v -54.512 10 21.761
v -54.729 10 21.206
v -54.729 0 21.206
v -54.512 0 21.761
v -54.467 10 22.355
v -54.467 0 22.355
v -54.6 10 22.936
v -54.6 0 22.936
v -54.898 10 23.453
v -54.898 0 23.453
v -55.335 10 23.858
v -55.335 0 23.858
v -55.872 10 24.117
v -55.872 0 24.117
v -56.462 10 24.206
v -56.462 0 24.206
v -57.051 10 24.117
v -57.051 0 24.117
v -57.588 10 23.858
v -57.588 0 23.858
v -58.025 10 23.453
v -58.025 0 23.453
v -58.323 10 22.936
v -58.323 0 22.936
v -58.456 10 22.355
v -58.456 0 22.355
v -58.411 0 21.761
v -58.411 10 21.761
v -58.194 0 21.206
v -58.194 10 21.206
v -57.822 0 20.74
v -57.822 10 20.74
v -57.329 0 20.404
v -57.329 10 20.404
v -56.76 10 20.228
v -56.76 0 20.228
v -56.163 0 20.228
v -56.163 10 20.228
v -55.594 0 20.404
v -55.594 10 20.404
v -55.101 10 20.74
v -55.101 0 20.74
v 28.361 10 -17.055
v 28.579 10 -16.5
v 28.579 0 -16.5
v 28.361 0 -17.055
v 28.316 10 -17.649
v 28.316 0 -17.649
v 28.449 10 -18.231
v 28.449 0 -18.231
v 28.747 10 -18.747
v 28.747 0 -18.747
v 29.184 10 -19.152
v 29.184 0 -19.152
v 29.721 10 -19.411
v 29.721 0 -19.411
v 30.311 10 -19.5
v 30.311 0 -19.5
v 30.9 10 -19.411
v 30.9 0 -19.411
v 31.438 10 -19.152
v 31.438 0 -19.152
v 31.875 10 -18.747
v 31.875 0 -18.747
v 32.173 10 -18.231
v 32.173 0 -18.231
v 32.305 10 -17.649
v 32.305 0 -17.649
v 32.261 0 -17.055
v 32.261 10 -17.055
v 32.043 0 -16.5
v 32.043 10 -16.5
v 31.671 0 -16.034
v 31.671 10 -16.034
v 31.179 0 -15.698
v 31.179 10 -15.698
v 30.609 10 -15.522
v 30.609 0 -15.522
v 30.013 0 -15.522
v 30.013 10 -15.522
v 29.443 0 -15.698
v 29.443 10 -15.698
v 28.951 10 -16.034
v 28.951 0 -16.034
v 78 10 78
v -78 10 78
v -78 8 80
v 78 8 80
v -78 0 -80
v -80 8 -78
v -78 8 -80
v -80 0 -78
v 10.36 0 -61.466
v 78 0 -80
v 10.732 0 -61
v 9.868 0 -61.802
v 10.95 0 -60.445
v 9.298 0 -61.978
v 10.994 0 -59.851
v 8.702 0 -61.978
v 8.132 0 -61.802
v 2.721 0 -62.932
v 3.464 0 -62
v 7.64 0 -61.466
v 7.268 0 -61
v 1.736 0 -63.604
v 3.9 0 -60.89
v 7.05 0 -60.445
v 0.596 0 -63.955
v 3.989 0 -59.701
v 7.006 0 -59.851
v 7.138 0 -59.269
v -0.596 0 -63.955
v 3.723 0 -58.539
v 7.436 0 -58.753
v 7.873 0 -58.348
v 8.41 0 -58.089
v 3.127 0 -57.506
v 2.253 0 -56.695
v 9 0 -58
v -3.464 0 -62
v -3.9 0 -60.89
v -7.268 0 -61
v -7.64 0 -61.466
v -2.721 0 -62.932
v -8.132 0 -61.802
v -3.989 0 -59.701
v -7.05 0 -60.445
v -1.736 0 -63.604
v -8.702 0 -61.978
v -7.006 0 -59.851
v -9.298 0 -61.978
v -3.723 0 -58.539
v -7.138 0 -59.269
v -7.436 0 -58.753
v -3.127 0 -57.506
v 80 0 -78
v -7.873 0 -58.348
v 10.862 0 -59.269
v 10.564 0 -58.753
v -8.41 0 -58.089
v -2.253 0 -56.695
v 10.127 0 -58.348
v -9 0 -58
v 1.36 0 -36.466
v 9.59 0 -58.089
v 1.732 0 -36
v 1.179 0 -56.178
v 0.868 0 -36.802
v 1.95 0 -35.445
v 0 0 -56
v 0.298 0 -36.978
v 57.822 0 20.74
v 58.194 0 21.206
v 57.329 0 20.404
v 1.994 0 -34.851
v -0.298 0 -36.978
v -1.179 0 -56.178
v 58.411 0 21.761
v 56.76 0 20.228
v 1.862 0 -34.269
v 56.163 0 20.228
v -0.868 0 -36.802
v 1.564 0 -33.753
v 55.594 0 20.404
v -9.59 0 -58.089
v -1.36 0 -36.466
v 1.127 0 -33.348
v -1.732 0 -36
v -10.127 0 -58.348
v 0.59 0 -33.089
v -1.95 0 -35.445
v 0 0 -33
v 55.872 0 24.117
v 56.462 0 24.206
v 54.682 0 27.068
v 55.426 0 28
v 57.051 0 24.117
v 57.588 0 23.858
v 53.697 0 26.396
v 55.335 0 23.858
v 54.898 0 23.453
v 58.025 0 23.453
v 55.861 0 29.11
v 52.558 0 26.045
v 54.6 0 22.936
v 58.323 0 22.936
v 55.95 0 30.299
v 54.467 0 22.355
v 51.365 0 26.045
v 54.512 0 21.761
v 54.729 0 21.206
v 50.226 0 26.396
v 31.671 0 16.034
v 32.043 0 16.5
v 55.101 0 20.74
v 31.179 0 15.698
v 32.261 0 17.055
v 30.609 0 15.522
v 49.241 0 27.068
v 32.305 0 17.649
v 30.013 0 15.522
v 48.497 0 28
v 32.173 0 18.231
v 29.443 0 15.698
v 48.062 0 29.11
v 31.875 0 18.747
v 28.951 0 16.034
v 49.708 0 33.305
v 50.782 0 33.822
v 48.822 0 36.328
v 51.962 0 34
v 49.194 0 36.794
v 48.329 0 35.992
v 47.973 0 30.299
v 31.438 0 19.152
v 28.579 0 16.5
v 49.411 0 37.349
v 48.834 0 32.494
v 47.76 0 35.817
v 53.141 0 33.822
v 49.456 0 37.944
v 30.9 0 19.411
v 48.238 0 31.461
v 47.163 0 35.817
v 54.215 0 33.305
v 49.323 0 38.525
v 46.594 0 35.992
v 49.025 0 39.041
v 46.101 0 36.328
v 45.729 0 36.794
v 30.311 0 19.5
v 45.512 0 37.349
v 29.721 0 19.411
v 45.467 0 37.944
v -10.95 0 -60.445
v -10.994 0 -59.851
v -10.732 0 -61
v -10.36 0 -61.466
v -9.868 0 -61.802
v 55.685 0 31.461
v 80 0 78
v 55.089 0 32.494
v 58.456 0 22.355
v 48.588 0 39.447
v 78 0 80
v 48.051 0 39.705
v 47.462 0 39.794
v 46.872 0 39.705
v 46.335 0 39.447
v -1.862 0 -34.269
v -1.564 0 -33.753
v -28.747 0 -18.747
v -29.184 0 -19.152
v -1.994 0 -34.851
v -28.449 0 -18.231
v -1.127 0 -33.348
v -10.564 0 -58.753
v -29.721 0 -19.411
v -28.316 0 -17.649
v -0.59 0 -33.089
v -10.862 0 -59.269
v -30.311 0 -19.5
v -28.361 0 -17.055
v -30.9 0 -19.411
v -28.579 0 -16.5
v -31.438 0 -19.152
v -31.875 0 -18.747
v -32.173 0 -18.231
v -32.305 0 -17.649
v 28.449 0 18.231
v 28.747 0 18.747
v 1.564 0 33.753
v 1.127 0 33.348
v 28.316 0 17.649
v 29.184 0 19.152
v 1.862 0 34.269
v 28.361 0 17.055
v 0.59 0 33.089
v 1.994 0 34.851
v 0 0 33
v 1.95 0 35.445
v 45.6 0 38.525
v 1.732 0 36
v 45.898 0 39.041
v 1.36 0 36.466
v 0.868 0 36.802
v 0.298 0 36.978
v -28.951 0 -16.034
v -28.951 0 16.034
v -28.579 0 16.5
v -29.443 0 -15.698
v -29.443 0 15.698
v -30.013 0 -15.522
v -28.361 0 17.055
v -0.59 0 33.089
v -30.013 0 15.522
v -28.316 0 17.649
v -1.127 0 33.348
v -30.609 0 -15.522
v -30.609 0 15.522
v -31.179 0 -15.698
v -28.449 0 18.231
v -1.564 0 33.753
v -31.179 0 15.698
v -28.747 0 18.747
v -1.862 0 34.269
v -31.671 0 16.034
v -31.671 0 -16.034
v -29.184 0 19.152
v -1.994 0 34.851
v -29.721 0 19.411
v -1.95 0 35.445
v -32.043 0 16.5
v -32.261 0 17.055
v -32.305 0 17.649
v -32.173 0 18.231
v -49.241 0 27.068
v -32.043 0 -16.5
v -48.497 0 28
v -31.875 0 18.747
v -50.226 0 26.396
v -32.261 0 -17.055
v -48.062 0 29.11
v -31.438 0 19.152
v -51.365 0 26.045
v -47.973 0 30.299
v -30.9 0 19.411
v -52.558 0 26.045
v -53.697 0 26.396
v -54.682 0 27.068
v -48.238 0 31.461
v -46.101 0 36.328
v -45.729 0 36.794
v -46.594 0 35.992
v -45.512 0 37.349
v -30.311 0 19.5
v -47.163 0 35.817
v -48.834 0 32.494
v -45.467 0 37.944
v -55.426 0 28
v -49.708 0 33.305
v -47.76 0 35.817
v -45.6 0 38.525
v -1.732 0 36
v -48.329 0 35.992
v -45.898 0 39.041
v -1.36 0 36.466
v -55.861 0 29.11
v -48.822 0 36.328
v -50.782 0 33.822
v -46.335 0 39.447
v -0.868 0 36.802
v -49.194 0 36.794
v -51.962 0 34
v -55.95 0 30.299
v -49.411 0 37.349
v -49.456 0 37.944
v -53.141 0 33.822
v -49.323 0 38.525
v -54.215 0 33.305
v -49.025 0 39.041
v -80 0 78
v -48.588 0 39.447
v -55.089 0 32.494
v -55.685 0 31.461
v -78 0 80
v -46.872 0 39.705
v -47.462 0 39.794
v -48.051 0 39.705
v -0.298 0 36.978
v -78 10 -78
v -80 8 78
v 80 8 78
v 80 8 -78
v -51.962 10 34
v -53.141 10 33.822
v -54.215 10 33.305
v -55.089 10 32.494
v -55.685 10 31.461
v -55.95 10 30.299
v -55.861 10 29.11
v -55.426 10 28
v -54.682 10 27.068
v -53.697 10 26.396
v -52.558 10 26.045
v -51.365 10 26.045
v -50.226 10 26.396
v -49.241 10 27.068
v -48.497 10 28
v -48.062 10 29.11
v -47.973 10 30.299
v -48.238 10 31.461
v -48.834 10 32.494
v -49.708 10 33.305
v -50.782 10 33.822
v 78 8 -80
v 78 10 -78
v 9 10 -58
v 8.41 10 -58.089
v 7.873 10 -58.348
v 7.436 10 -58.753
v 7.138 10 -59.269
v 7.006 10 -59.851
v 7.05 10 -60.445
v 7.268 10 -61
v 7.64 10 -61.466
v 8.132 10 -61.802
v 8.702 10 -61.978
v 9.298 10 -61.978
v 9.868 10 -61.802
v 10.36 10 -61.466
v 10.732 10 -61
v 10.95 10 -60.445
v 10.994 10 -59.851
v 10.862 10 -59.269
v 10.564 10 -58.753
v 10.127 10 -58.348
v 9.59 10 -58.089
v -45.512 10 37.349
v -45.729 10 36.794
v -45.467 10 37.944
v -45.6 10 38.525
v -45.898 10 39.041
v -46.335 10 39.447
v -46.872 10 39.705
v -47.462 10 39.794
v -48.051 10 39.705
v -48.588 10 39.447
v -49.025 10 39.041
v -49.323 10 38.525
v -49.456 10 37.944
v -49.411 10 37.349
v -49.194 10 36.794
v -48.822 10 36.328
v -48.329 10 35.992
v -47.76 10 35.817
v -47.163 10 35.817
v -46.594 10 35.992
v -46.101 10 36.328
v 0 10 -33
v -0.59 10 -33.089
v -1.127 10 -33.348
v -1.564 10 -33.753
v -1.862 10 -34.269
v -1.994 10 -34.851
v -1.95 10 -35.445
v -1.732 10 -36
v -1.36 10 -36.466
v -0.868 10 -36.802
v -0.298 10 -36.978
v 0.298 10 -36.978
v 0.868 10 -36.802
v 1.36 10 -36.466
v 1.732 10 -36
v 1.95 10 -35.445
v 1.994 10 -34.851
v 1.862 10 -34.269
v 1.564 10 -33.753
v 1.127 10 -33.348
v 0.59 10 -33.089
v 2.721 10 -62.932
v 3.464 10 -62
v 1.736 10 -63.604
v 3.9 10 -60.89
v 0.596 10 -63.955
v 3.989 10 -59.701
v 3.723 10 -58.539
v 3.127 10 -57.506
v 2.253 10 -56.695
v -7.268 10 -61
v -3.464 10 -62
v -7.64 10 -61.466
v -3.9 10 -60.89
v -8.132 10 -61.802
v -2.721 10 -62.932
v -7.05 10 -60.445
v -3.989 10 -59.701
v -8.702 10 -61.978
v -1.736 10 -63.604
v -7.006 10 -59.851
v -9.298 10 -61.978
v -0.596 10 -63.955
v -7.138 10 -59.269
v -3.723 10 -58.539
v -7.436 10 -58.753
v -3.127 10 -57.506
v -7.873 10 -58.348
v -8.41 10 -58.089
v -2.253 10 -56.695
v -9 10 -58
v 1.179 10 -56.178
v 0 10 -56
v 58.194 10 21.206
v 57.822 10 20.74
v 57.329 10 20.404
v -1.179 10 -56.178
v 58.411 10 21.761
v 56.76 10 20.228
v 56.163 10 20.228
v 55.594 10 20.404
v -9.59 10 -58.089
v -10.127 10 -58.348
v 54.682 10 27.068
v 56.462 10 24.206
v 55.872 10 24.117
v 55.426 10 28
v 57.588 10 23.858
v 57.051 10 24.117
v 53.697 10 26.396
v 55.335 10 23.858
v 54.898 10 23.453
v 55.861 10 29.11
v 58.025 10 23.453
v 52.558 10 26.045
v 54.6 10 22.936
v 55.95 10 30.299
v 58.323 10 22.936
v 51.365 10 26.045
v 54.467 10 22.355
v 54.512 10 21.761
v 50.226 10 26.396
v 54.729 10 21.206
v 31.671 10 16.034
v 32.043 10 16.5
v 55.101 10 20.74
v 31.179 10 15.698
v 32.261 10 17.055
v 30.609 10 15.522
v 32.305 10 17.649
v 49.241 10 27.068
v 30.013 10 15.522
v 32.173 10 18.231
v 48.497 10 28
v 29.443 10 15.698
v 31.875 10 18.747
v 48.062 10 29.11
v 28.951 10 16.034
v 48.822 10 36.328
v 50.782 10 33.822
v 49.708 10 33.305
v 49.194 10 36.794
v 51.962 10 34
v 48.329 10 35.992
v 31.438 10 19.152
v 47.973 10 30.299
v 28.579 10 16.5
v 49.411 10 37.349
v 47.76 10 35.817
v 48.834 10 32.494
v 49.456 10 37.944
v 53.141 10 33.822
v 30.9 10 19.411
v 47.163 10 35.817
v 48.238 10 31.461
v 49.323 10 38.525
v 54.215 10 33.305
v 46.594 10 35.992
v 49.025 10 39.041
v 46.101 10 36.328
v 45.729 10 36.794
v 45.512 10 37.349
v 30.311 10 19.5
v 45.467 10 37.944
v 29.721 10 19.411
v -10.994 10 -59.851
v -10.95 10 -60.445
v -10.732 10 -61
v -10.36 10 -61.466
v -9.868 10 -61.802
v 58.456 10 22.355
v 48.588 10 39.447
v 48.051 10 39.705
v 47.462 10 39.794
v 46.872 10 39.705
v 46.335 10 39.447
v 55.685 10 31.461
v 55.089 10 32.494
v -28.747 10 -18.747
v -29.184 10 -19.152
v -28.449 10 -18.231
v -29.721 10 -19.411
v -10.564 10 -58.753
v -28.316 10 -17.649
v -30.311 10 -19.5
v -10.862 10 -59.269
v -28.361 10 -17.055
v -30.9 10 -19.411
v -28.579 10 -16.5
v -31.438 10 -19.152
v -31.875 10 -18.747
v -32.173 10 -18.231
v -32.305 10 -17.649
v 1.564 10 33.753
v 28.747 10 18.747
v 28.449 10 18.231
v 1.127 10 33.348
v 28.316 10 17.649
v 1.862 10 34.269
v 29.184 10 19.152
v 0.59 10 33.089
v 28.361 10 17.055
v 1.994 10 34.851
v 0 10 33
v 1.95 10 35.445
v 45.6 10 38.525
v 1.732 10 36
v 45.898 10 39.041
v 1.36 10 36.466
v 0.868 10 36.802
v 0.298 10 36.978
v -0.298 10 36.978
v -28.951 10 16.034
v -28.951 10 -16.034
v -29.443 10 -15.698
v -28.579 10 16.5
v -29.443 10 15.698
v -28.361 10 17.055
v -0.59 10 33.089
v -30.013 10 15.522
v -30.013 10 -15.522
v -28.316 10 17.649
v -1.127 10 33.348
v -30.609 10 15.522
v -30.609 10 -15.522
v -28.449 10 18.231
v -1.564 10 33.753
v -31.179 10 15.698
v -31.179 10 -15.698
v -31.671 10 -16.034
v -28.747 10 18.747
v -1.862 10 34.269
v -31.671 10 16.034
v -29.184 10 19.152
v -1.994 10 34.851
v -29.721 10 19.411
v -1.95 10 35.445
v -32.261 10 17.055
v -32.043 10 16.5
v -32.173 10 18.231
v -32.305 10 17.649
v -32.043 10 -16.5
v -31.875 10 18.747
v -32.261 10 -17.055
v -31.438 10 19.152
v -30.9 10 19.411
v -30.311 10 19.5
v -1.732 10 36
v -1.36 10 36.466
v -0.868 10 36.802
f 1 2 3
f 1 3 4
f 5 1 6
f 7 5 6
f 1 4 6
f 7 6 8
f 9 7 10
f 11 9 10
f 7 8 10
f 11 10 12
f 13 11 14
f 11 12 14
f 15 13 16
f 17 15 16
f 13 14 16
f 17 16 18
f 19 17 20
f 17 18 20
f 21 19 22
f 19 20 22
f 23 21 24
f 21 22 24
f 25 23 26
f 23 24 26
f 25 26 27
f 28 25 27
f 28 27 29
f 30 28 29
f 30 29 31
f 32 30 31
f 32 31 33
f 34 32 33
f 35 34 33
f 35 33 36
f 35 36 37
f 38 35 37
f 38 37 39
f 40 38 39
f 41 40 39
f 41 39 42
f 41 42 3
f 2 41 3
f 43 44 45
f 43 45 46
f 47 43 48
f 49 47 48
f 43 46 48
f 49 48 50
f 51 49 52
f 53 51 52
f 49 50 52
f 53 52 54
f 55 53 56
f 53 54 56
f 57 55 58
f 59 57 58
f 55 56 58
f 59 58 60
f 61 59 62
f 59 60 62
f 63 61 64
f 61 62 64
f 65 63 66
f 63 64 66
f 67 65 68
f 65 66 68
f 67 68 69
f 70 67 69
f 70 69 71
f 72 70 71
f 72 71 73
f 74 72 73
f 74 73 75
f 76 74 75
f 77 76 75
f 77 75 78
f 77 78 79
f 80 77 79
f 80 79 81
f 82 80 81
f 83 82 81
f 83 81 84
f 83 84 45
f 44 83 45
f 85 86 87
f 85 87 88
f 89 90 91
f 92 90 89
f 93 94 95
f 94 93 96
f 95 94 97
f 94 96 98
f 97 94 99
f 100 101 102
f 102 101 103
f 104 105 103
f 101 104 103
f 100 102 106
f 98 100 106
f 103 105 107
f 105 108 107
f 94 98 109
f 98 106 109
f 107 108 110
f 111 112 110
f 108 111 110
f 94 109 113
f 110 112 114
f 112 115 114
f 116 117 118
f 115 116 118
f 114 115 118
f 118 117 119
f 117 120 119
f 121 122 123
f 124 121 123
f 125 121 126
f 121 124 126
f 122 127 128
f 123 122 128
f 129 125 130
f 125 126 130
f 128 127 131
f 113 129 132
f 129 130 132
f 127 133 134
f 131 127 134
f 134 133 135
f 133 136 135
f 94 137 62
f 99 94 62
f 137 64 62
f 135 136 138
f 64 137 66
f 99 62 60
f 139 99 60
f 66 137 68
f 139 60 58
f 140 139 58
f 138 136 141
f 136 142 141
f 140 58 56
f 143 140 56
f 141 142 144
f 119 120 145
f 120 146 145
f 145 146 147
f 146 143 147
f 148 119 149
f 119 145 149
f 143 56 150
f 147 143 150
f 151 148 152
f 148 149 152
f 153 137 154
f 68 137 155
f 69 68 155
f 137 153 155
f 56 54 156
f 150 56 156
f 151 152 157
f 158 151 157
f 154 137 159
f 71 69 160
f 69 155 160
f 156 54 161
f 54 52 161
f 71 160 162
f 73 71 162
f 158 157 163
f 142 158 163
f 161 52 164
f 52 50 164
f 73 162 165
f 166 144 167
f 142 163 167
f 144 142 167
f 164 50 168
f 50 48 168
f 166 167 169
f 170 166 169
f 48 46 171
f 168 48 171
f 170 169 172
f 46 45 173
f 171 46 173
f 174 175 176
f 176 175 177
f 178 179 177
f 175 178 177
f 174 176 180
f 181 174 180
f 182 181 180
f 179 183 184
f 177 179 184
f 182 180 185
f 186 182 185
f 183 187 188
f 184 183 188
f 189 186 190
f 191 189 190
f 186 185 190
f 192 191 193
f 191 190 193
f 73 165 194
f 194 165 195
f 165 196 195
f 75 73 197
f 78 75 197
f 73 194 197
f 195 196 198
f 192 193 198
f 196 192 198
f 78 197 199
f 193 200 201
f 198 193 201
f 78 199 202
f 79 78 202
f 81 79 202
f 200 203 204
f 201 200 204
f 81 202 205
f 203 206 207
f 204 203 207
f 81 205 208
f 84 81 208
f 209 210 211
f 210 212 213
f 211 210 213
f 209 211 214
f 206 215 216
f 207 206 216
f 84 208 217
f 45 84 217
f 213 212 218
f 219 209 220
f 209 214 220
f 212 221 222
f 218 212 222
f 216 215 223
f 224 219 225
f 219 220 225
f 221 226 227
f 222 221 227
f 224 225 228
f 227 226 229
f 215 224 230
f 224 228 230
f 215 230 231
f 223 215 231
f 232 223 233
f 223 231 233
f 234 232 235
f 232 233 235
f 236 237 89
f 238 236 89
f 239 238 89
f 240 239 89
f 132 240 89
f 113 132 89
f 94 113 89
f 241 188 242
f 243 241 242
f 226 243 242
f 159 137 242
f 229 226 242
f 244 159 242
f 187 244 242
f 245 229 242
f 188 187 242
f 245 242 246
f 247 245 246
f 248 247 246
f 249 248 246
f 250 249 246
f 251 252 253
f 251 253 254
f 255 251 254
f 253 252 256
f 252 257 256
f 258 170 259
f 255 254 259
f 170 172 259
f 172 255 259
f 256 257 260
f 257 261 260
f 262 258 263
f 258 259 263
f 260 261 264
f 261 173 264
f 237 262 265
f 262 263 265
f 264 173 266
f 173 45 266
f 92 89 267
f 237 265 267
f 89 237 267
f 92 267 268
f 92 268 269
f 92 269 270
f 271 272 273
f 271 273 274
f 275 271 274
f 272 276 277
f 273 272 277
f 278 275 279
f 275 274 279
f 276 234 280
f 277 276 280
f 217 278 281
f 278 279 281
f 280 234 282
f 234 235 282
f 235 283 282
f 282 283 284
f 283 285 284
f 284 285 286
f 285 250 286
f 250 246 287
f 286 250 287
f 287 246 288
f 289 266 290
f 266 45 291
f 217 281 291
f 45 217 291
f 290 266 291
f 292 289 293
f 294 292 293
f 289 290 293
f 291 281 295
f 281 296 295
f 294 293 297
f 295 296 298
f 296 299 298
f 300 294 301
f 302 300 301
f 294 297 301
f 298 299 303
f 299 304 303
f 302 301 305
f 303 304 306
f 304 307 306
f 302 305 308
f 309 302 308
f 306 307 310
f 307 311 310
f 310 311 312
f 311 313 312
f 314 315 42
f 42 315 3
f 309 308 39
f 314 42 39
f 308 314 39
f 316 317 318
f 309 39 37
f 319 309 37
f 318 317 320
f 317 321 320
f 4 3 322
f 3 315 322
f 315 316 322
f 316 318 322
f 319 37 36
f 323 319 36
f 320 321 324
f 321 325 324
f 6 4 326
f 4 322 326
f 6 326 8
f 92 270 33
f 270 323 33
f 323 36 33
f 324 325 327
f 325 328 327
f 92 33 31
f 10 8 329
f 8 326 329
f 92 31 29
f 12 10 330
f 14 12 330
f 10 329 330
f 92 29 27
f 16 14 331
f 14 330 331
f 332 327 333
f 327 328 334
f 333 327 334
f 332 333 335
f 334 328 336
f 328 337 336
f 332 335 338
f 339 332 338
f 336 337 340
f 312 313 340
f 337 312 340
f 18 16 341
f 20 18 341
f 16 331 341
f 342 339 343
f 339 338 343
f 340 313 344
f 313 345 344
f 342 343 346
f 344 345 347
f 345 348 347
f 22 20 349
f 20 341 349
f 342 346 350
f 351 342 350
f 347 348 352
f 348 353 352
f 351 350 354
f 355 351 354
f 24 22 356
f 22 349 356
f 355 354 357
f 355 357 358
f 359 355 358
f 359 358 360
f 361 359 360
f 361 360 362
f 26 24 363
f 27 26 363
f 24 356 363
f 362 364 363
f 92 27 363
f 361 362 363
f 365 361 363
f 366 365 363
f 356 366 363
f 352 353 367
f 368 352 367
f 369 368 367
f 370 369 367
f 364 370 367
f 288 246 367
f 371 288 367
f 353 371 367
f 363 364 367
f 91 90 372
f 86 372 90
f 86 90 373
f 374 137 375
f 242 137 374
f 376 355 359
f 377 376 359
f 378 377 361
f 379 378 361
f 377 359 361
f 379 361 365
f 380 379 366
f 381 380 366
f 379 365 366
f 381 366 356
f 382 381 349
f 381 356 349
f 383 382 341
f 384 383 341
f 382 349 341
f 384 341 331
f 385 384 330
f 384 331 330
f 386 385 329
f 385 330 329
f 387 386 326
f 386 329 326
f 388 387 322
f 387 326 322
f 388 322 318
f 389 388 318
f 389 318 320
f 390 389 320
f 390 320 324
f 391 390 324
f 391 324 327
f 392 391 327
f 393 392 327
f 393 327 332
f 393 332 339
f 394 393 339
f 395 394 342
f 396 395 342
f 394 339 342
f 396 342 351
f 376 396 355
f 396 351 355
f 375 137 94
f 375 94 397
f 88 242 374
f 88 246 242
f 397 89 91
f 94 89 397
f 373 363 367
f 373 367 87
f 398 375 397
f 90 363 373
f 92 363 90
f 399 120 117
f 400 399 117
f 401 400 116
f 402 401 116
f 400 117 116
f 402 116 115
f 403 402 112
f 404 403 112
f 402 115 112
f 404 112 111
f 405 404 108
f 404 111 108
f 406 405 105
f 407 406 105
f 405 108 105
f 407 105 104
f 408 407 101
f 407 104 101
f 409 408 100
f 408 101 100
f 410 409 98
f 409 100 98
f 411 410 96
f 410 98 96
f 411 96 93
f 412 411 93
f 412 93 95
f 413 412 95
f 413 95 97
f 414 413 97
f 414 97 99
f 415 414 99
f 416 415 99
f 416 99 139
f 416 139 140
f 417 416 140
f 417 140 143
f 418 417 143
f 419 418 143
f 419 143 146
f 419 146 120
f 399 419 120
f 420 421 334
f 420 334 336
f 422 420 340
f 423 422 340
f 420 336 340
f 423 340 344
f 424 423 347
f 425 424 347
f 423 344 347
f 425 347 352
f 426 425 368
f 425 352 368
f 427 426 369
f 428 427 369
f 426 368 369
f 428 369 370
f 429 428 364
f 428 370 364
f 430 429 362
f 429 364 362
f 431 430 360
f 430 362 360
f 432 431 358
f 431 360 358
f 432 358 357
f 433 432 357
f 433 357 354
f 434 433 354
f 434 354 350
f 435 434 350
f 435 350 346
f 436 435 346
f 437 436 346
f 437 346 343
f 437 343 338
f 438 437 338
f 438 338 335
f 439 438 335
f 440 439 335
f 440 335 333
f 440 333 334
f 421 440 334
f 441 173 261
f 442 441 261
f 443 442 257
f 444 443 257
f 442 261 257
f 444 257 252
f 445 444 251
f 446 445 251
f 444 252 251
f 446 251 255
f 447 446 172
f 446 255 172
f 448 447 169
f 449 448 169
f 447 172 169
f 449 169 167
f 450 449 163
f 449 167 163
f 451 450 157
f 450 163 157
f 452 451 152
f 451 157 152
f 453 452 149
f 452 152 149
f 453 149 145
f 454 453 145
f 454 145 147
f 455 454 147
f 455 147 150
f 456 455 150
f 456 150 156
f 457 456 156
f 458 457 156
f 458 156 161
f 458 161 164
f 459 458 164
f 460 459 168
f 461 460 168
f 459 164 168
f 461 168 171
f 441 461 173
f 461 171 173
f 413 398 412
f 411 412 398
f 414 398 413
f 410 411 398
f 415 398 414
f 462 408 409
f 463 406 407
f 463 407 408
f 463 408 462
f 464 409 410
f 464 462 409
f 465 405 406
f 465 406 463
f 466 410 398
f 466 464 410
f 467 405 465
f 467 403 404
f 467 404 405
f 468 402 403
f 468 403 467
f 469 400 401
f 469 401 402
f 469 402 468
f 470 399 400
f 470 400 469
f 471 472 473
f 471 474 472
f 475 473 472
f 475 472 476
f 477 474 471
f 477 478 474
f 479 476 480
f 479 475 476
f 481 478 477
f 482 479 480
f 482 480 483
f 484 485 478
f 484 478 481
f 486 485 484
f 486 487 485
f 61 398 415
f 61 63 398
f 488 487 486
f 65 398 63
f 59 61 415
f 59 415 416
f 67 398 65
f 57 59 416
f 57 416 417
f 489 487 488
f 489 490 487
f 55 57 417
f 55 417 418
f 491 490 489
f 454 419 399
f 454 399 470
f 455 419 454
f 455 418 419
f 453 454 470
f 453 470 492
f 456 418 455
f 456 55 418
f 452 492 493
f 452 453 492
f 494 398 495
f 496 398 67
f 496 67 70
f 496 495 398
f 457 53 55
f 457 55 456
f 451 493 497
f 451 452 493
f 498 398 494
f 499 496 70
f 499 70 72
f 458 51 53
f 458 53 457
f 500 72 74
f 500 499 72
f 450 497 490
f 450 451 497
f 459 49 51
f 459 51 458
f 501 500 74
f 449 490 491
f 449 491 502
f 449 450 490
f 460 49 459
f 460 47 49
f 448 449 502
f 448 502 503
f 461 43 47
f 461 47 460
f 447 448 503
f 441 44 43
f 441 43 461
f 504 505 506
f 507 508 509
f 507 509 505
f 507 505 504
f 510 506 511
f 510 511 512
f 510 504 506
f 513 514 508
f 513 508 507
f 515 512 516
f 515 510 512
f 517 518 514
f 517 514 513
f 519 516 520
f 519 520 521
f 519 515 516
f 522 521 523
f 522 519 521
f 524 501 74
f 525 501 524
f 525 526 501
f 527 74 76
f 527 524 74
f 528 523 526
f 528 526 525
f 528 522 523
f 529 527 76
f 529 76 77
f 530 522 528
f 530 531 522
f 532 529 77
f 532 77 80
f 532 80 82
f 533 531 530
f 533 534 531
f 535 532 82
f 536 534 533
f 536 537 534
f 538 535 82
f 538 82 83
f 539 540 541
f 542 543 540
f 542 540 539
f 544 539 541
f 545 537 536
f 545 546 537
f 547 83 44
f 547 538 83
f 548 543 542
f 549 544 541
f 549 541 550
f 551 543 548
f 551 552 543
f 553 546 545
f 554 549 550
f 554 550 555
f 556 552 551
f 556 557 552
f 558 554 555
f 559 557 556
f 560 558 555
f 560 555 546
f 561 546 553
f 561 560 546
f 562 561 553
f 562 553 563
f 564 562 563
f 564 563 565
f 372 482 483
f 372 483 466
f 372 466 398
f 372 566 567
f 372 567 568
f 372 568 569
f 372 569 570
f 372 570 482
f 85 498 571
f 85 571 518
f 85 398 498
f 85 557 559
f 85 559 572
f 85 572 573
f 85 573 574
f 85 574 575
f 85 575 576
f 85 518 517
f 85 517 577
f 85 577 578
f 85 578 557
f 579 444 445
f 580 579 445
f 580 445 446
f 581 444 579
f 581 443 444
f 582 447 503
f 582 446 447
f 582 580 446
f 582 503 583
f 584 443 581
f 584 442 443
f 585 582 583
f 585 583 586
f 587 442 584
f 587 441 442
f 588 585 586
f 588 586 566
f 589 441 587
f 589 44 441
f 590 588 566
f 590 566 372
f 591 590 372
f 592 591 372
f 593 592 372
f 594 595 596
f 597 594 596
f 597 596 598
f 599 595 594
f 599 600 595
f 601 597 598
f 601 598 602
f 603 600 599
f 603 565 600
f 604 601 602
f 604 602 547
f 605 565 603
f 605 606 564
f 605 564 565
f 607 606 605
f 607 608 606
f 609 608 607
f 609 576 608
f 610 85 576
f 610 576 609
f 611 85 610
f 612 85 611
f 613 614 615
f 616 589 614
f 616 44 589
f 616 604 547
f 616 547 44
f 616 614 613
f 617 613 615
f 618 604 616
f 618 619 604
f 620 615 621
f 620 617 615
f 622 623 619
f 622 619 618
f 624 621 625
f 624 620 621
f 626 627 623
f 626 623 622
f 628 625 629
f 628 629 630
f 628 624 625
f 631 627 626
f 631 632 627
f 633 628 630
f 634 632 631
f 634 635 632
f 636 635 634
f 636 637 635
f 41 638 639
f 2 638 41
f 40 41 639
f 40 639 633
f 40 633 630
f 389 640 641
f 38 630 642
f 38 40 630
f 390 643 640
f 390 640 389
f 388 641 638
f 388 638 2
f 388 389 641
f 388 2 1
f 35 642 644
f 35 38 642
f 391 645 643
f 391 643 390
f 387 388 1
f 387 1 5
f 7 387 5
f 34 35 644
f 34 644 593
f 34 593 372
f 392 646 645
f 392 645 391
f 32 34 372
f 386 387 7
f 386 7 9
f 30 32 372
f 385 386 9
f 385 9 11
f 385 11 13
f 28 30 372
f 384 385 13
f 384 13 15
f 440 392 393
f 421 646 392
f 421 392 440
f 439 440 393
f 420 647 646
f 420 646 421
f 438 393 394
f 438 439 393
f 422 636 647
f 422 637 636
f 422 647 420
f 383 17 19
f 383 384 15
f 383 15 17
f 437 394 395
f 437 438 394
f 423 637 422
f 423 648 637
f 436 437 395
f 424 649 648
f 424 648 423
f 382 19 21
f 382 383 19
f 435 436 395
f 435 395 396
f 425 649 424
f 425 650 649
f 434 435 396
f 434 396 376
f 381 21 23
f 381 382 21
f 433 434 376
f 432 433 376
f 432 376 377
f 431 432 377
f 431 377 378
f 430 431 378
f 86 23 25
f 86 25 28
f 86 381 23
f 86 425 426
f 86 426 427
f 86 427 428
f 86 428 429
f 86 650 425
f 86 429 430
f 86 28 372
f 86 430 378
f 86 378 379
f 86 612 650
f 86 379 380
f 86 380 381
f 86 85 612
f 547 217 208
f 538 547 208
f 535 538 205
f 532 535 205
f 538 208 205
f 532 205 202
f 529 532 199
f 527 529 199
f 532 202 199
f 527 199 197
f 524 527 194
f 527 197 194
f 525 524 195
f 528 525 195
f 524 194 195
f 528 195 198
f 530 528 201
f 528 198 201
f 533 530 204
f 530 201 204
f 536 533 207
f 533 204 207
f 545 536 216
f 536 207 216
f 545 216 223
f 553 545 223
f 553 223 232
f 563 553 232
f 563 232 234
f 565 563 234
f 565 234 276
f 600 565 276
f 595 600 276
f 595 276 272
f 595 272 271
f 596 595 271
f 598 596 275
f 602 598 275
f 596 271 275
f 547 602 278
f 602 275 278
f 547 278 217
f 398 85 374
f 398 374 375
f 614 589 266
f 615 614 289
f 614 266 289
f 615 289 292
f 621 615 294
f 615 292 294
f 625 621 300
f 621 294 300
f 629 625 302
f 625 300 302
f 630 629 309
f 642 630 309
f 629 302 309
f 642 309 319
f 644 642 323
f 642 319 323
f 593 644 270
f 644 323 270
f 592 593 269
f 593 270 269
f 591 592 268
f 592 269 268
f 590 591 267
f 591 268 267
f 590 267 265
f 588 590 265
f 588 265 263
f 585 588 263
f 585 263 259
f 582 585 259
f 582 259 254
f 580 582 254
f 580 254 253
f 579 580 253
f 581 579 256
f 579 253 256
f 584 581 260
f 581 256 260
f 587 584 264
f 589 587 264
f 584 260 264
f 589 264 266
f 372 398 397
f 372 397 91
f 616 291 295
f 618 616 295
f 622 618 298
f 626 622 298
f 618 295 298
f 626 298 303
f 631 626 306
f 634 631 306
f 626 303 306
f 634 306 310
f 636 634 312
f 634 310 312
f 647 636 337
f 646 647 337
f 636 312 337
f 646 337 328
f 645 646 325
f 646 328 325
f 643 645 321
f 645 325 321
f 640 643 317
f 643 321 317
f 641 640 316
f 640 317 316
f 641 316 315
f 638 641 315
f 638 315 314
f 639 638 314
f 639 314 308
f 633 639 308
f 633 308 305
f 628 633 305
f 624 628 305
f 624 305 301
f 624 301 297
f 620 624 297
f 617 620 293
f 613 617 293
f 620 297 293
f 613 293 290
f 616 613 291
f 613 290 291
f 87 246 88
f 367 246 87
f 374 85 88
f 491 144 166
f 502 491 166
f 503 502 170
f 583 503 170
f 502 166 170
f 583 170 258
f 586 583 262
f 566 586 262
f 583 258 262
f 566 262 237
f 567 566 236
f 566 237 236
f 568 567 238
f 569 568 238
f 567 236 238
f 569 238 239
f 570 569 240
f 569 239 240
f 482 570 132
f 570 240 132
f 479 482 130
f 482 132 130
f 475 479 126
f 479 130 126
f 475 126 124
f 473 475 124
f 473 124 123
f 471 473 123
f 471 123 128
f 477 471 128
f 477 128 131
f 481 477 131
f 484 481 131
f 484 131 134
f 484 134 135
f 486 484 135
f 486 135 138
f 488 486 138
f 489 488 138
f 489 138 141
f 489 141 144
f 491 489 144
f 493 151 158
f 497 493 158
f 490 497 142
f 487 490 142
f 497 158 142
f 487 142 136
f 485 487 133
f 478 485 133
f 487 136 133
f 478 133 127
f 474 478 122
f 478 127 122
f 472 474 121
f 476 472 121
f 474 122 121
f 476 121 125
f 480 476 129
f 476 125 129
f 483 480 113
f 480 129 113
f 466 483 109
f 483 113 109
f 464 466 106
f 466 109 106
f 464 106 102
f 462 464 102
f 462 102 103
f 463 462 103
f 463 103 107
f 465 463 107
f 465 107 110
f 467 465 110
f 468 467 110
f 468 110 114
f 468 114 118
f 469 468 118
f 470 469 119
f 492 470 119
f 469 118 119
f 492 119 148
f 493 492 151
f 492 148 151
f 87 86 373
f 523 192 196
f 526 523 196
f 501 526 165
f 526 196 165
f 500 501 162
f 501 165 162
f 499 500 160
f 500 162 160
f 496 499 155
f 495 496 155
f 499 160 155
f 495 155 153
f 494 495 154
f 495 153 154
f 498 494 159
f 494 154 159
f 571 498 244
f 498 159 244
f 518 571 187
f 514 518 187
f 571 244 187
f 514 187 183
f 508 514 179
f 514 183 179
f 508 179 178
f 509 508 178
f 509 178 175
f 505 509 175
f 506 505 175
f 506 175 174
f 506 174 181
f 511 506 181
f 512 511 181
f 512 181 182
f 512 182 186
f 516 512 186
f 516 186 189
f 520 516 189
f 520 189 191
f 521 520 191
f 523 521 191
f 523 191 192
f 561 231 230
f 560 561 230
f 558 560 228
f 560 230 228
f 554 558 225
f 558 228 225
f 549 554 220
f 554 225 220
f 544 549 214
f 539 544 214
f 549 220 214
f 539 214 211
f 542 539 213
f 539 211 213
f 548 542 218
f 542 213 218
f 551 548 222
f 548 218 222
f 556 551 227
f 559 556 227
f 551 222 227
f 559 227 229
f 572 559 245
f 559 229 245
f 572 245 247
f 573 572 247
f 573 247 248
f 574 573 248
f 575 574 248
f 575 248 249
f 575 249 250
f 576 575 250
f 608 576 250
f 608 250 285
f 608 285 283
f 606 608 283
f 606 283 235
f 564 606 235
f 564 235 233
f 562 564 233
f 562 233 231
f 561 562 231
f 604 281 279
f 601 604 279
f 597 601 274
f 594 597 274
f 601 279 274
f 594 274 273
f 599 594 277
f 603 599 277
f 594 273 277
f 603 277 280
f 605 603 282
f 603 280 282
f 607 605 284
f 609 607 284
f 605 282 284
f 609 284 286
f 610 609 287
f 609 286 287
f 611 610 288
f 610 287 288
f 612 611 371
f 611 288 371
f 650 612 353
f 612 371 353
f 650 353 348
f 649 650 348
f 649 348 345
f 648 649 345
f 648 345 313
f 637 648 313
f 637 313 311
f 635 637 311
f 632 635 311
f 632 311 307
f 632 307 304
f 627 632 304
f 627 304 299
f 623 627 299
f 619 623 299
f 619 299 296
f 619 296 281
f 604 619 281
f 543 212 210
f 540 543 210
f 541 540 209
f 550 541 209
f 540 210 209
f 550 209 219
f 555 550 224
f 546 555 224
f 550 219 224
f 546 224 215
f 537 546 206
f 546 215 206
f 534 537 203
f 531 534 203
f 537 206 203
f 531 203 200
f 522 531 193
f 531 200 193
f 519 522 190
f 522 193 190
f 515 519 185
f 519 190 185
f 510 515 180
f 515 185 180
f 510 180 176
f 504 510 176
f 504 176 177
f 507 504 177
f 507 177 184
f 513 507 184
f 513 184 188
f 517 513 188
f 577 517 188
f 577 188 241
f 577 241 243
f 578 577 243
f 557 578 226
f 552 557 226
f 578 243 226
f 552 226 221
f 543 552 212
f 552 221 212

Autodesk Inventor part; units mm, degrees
ref_plane "YZ Plane" through (0, 0, 0) normal (1, 0, 0) x (0, 1, 0)
ref_plane "XZ Plane" through (0, 0, 0) normal (0, 1, 0) x (-1, 0, 0)
ref_plane "XY Plane" through (0, 0, 0) normal (0, 0, 1) x (1, 0, 0)
sketch "Sketch1" plane through (0, 0, 0) normal (0, 1, 0) x (-1, 0, 0)
  point P0 (0, 0)
sketch "Sketch2" plane through (0, 0, 0) normal (0, 1, 0) x (-1, 0, 0)
  line L0 (80, -80) -> (-80, -80)
  line L1 (-80, -80) -> (-80, 80)
  line L2 (-80, 80) -> (80, 80)
  line L3 (80, 80) -> (80, -80)
  line L4 (80, -80) -> (-80, 80) construction
  line L5 (-80, -80) -> (80, 80) construction
  point P0 (0, 0)
  dimension "d0" = 160
  dimension "d1" = 160
extrude "Extrusion1" add sketch "Sketch2" along normal blind 10
chamfer "Chamfer1" distance 2 angle 45 8 edges at (80, 10, 0) (0, 10, 80) (80, 5, 80) (80, 5, -80) (-80, 10, 0) (-80, 5, 80) (-80, 5, -80) (0, 10, -80)
sketch "Sketch3" plane through (0, 10, 0) normal (0, 1, 0) x (1, 0, 0)
  point P0 (0, 0)
  point P1 (0, 60)
  point P2 (-51.9615, -30)
  point P3 (51.9615, -30)
  dimension "d8" = 60
  dimension "d11" = 360
hole "Hole1" at (0, 10, -60) at (-51.9615, 10, 30) at (51.9615, 10, 30) direction (0, -1, 0) diameter 8 end through all
sketch "Sketch4" plane through (0, 10, 0) normal (0, 1, 0) x (1, 0, 0)
  circle A0 centre (0, 60) radius 4 projected
  point P0 (0, 0)
  point P1 (-9, 60)
  point P2 (9, 60)
  dimension "d20" = 18
  dimension "d21" = 9
hole "Hole2" at (-9, 10, -60) at (9, 10, -60) direction (0, -1, 0) diameter 4 end through all
pattern_circular "Circular Pattern1" count 3 over 360 about axis through (0, -10, 0) along (0, 1, 0) of "Hole2"
sketch "Sketch5" plane through (0, 10, 0) normal (0, 1, 0) x (1, 0, 0)
  point P0 (0, 0)
  point P1 (0, 35)
  dimension "d32" = 35
hole "Hole3" at (0, 10, -35) direction (0, -1, 0) diameter 4 end through all
pattern_circular "Circular Pattern2" count 6 over 360 about axis through (0, -10, 0) along (0, 1, 0) of "Hole3"
properties part number "De_Go" material "Wood (Oak)"
